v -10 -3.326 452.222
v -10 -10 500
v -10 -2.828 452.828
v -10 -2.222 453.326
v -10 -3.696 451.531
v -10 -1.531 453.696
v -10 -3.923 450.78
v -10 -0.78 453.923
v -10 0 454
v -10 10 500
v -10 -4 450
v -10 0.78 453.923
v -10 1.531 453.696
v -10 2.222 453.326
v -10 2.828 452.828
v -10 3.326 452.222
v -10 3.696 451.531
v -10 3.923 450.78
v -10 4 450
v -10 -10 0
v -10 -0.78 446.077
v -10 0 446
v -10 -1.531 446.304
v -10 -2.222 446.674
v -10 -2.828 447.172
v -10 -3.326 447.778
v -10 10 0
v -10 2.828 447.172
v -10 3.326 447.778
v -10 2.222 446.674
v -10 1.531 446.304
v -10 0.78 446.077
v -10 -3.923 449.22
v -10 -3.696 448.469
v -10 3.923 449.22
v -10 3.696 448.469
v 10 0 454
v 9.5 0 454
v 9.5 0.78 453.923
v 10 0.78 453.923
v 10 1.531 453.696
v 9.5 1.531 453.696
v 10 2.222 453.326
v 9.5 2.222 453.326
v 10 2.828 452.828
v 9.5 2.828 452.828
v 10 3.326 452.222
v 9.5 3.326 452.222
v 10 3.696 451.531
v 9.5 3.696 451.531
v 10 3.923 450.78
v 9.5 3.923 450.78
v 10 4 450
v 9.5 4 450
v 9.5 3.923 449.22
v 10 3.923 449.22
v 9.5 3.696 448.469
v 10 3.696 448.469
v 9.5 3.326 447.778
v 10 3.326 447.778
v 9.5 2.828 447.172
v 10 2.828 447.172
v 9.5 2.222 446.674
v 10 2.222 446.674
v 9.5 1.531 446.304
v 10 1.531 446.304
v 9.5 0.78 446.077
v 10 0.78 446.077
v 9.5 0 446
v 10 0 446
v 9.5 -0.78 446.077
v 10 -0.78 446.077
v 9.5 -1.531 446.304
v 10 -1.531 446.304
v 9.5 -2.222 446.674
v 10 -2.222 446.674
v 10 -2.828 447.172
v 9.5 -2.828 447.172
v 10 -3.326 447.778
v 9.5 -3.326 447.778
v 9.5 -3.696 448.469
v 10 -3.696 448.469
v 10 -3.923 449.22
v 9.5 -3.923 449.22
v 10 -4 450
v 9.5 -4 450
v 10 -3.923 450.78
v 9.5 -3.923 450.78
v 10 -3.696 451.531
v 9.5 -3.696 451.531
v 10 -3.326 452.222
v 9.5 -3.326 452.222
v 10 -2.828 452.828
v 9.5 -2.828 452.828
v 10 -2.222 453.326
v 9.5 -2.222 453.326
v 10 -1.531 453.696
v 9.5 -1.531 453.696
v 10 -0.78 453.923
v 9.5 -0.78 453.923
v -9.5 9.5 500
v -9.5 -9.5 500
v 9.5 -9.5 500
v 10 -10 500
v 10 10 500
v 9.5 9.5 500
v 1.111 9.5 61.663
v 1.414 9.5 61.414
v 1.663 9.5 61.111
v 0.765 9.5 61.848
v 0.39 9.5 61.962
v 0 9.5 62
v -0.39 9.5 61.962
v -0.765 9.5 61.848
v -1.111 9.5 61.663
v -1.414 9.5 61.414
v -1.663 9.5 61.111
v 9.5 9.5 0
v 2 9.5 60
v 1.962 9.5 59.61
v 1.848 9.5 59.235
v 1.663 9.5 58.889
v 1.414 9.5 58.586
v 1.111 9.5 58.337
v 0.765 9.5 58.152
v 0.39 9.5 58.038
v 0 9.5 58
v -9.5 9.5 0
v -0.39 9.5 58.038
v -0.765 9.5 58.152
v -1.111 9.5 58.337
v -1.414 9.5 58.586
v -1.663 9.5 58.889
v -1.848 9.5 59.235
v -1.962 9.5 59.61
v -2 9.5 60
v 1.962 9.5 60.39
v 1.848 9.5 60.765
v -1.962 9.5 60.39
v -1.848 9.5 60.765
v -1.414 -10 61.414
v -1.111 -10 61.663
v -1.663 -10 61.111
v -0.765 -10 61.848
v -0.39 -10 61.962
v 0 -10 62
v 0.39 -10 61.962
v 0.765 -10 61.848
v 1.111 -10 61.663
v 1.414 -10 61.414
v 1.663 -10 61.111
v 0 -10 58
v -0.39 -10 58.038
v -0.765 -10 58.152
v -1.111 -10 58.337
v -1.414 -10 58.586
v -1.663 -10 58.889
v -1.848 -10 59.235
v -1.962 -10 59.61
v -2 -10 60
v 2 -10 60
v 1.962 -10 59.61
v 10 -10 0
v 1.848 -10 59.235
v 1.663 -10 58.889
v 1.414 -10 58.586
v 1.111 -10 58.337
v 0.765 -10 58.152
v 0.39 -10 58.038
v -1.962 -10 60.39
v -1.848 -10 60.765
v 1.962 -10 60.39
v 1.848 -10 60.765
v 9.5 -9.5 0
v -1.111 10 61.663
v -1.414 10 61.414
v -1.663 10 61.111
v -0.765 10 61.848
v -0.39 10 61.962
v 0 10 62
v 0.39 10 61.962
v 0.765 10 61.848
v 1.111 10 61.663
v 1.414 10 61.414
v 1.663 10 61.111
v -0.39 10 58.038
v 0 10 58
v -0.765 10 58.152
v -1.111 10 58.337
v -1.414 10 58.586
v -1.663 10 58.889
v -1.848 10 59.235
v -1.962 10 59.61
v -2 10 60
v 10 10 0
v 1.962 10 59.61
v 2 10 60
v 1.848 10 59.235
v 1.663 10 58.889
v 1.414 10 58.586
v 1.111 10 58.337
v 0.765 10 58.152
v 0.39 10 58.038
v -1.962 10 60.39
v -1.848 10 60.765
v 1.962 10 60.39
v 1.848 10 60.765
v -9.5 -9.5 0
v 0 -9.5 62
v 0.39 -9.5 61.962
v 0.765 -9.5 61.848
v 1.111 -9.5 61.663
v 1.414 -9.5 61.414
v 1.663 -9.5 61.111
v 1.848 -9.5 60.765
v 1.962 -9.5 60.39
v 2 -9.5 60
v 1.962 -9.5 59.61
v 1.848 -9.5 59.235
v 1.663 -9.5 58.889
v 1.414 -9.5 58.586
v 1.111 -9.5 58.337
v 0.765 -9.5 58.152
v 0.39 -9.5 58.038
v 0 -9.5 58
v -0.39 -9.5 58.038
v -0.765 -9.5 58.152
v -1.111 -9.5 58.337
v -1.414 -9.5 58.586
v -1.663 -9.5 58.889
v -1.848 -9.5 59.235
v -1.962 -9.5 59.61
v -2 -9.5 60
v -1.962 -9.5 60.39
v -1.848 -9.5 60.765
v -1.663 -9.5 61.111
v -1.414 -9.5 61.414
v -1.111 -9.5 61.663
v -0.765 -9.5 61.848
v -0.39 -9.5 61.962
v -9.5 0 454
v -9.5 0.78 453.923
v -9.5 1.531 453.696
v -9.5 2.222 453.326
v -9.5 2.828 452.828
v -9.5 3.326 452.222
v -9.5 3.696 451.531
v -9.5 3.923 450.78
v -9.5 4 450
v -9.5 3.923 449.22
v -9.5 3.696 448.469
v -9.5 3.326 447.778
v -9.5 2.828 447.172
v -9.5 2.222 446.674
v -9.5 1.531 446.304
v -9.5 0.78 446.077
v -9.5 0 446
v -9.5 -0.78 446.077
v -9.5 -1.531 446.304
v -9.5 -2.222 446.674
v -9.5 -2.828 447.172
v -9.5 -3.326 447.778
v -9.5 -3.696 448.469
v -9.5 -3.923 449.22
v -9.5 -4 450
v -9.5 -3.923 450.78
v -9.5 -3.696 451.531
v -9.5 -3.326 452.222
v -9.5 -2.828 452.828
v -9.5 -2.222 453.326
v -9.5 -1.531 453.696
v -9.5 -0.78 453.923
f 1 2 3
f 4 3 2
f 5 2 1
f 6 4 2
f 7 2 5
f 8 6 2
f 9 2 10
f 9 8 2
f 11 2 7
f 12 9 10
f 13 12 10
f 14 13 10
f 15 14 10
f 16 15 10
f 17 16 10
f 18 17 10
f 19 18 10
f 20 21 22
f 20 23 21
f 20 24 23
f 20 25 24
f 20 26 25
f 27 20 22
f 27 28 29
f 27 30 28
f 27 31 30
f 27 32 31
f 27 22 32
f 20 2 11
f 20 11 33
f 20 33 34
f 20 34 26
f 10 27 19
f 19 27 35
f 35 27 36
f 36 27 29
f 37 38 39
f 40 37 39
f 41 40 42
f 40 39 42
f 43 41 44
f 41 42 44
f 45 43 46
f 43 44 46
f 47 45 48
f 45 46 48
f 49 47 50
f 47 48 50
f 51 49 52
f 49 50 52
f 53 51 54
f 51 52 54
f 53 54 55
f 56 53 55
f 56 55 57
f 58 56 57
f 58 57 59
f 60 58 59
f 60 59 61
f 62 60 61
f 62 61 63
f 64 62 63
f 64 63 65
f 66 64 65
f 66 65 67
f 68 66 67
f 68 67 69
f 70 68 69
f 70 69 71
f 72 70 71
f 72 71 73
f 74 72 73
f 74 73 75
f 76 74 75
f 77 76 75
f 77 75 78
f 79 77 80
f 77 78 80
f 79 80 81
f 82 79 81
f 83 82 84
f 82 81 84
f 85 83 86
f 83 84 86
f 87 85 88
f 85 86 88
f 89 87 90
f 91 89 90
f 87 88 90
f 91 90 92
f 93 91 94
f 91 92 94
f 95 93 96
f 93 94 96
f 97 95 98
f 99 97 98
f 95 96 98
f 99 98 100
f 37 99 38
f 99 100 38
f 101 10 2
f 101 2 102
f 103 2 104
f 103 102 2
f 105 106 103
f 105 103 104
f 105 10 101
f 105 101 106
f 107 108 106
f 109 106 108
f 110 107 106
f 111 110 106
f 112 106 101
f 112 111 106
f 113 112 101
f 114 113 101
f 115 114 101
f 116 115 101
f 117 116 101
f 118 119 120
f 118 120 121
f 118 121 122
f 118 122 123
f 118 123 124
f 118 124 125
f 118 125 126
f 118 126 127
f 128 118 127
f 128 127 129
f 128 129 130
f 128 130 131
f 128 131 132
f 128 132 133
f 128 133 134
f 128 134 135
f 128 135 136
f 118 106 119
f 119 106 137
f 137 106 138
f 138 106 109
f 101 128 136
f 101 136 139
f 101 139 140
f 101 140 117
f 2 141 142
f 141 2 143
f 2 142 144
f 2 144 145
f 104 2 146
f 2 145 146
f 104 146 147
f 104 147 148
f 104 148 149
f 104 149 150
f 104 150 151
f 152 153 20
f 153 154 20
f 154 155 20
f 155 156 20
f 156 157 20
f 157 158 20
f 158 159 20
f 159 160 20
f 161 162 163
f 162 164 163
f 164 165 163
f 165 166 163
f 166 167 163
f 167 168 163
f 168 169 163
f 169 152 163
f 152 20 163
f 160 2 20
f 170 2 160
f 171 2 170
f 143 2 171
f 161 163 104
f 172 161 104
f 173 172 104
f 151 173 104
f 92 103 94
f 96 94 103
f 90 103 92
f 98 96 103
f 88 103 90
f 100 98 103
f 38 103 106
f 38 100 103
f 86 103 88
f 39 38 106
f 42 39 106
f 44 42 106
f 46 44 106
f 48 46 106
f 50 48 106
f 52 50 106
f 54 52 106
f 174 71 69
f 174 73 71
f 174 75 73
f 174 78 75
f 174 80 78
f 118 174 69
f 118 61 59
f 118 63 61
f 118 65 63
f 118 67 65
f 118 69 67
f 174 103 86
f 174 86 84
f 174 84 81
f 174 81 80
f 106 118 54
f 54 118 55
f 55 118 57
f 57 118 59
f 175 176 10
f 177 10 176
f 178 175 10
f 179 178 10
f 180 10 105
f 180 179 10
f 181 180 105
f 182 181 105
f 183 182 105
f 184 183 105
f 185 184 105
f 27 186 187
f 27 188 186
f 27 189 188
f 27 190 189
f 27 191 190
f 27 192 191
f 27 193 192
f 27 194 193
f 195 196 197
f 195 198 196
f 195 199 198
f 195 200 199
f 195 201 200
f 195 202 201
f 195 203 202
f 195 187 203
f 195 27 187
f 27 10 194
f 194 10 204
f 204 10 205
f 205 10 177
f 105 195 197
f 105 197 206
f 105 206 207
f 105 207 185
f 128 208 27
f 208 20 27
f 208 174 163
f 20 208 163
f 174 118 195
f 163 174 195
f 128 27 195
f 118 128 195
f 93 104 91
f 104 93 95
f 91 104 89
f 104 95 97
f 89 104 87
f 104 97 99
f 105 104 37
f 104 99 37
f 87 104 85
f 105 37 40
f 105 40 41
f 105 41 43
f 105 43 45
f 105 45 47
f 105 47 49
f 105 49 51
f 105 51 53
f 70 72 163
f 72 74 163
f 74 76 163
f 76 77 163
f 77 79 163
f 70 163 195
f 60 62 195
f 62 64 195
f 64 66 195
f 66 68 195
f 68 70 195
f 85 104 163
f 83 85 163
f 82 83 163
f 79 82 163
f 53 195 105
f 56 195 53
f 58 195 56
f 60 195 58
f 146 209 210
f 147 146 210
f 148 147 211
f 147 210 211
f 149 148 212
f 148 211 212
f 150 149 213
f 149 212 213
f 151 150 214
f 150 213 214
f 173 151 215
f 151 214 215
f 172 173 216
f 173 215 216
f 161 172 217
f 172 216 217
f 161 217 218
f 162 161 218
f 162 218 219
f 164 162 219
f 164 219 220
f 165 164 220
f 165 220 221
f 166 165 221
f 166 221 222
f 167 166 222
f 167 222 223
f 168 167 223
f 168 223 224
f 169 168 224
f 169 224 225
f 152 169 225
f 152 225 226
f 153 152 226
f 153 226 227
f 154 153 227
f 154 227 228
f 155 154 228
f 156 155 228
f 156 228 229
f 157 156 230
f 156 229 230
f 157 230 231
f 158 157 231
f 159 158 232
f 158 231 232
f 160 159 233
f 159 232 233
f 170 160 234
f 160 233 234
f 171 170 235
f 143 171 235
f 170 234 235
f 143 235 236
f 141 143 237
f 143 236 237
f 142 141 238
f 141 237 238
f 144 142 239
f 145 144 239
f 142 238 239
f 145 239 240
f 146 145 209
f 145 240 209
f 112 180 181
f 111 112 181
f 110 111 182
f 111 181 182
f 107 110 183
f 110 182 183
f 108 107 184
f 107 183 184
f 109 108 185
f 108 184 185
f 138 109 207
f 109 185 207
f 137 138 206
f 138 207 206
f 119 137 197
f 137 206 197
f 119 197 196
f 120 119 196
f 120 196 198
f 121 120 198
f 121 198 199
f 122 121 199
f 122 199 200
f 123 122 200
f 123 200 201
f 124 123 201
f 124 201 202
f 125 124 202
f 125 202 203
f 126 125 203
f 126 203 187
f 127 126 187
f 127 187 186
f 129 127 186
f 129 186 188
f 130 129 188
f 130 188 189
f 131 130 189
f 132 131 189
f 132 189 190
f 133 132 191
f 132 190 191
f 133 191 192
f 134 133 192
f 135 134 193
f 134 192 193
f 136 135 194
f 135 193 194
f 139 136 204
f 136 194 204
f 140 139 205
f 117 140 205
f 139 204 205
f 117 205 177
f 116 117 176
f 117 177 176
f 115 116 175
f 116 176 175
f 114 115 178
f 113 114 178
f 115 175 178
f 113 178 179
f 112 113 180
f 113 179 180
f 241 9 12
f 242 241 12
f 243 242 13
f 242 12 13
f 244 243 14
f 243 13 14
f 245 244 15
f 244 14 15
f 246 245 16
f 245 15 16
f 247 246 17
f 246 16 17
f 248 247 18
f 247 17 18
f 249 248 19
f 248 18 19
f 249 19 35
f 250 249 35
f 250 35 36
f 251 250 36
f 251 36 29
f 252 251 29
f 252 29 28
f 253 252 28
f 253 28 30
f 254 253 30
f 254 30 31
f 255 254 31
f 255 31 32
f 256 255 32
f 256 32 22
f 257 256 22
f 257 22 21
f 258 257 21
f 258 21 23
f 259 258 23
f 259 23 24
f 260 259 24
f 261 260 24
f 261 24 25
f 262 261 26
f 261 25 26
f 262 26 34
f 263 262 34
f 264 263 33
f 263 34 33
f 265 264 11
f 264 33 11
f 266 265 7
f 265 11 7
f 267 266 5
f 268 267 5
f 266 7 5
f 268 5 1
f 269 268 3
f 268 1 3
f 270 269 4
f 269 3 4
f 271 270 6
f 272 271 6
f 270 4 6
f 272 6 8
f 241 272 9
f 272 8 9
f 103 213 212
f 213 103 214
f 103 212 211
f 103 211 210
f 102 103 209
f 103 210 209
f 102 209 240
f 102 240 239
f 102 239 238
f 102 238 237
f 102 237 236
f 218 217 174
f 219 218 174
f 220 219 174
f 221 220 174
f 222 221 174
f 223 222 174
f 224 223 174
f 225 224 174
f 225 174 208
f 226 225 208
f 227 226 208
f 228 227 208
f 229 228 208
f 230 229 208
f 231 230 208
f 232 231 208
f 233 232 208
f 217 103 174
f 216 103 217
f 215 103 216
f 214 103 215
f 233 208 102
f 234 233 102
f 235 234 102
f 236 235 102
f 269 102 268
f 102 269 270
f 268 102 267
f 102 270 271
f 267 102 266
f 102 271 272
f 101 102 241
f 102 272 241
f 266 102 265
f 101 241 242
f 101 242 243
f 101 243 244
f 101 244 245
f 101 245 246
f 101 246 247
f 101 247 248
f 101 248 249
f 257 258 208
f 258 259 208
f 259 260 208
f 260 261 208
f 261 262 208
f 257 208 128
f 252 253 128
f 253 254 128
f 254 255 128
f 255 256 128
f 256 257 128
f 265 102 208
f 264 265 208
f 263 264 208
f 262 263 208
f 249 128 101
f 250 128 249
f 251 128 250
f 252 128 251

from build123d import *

# Parameters (mm, degrees)
SKETCH1_W           = 20
SKETCH1_H           = 20
BOSS_EXTRUDE1_DEPTH = 500
SKETCH2_W           = 19
SKETCH2_H           = 19
CUT_EXTRUDE1_DEPTH  = 501.199960016
SKETCH3_R           = 2
CUT_EXTRUDE2_DEPTH  = 20
SKETCH5_R           = 4
CUT_EXTRUDE3_DEPTH  = 20


with BuildPart() as part:
    # Sketch1 → Boss-Extrude1 (new body)
    with BuildSketch(Plane.XY):
        Rectangle(SKETCH1_W, SKETCH1_H)
    extrude(amount=BOSS_EXTRUDE1_DEPTH)

    # Sketch2 → Cut-Extrude1 (cut, through all)
    with BuildSketch(Plane(origin=(0, 0, 0), x_dir=(-1, 0, 0), z_dir=(0, 0, -1))):
        Rectangle(SKETCH2_W, SKETCH2_H)
    extrude(amount=-CUT_EXTRUDE1_DEPTH, mode=Mode.SUBTRACT)

    # Sketch3 → Cut-Extrude2 (cut)
    with BuildSketch(Plane(origin=(0, 10, 0), x_dir=(1, 0, 0), z_dir=(0, 1, 0))):
        with Locations(Location((0, -60, 0), (0, 0, 270))):
            Circle(SKETCH3_R)
    extrude(amount=-CUT_EXTRUDE2_DEPTH, mode=Mode.SUBTRACT)

    # Sketch5 → Cut-Extrude3 (cut)
    with BuildSketch(Plane.ZY.offset(10)):
        with Locations((450, 0)):
            Circle(SKETCH5_R)
    extrude(amount=-CUT_EXTRUDE3_DEPTH, mode=Mode.SUBTRACT)


solid = part.part
